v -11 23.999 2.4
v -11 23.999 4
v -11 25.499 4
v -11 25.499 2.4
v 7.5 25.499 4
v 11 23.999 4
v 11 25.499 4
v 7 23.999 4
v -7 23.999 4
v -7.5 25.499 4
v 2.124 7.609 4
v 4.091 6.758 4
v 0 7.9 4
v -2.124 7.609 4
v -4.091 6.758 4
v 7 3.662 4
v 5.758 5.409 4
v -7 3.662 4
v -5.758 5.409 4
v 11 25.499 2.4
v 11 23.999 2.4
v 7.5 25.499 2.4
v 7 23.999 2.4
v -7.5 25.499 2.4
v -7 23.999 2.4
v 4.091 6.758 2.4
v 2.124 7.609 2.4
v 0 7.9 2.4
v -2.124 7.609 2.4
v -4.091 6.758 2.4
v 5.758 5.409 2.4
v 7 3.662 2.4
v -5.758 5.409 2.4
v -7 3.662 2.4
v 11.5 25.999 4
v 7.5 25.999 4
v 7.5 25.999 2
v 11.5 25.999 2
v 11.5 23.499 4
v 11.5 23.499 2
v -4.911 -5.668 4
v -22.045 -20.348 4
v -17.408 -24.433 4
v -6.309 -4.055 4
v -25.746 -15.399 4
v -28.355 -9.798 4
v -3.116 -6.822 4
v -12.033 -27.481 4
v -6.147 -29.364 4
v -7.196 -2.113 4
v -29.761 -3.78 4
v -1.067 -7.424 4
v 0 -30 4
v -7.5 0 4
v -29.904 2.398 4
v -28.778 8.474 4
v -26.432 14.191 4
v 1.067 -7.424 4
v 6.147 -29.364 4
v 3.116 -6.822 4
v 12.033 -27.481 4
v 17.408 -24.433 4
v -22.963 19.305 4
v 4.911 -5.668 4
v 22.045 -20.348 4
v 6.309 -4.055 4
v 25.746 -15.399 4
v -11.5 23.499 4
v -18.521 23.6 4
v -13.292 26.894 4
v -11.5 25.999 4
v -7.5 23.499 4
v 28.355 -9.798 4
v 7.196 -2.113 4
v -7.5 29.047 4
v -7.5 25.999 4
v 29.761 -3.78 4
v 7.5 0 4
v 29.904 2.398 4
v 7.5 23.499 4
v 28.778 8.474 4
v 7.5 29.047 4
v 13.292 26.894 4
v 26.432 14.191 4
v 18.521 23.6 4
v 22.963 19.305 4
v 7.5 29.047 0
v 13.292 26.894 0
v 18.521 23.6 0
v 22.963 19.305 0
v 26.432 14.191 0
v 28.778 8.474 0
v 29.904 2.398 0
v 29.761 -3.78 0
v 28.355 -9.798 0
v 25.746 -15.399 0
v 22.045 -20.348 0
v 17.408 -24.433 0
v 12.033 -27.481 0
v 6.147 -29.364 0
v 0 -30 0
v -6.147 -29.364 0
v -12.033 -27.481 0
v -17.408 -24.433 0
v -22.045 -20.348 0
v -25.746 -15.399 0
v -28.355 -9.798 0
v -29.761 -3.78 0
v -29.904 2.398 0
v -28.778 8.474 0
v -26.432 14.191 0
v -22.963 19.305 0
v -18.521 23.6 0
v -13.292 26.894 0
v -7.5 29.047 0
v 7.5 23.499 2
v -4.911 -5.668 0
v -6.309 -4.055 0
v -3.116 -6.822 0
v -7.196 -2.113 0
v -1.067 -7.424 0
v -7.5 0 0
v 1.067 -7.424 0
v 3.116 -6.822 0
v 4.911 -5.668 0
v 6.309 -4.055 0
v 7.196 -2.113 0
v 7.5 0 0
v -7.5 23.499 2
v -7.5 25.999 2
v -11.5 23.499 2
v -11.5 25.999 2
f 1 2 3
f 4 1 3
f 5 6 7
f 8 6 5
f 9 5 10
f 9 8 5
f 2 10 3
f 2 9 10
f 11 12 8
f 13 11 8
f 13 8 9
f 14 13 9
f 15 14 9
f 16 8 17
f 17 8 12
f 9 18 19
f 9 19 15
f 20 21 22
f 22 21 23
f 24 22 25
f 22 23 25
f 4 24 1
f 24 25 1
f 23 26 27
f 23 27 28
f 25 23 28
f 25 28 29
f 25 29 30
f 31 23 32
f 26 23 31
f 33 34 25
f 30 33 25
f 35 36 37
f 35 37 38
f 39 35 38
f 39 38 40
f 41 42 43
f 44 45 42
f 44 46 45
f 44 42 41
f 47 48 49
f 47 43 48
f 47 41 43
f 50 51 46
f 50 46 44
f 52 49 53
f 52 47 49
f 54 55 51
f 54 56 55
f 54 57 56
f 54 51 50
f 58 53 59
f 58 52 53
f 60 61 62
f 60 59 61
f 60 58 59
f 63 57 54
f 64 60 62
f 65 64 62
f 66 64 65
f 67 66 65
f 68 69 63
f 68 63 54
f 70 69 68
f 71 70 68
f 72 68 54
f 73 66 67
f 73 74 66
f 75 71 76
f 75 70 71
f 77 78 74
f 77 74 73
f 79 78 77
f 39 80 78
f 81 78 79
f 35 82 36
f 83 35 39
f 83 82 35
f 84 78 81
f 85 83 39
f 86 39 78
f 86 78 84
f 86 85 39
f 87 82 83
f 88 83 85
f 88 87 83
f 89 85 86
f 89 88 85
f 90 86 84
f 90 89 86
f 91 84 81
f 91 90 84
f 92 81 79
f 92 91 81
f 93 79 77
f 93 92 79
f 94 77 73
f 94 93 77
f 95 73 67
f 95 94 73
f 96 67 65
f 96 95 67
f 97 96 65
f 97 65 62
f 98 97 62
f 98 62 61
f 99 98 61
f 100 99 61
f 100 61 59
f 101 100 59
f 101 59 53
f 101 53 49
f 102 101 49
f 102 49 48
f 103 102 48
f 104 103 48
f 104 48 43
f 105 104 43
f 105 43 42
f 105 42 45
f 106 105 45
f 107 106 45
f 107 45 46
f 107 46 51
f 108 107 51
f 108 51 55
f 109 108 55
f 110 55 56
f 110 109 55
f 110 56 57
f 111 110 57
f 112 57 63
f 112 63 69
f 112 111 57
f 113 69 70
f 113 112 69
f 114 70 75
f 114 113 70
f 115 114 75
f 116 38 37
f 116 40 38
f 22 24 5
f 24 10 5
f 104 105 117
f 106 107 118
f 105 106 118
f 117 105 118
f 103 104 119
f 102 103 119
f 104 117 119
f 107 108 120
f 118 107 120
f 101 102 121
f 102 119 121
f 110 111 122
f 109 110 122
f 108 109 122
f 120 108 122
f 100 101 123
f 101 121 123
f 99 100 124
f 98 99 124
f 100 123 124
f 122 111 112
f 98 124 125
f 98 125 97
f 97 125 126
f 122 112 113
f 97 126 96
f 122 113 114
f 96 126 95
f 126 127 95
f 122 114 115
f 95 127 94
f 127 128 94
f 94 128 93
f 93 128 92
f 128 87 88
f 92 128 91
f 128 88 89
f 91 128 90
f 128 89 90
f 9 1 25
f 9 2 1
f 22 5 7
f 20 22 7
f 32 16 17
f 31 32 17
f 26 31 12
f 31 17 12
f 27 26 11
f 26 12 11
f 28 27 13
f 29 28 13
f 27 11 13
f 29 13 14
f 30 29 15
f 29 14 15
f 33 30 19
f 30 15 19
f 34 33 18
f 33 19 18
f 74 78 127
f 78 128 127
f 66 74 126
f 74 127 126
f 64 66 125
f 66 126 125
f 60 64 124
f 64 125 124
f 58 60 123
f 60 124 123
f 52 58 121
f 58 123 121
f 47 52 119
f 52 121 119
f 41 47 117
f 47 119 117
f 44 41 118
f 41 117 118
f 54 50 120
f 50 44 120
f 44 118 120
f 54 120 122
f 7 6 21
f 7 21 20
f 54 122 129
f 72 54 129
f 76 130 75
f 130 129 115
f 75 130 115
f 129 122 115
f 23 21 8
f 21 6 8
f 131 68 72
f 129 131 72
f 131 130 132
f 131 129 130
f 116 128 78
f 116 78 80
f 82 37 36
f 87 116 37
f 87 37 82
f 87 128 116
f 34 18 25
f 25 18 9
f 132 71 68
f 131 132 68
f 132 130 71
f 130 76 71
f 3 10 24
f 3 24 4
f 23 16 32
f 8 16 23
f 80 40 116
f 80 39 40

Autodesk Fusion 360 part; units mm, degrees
sketch "Sketch1" plane through (0, 0, 0) normal (0, 0, 1) x (1, 0, 0)
  circle A0 centre (0, 0) radius 30
  circle A1 centre (0, 0) radius 7.5
  line L0 (-7.5, 0) -> (-7.5, 29.0474)
  line L1 (7.5, 0) -> (7.5, 29.0474)
  dimension "d1" = 60
  dimension "d2" = 15
extrude "Extrude1" add sketch "Sketch1" along normal blind 4 contours A0 A1 L0 L1 picked at (-22.4151, 1.0871) makes body 1
copy_body "Body->Comp1" bodies 1 removing the originals makes body 2 in component "cap"
sketch "Sketch2" plane through (0, 0, 4) normal (0, 0, 1) x (-1, 0, 0)
  line L0 (7.5, 0) -> (7.5, -29.0474)
  arc A0 (7.5, -29.0474) -> (-7.5, -29.0474) centre (0, 0) ccw
  line L1 (-7.5, -29.0474) -> (-7.5, 0)
  arc A1 (7.5, 0) -> (-7.5, 0) centre (0, 0) ccw
  line L2 (7.5, -25.9986) -> (11.5, -25.9986)
  line L3 (11.5, -25.9986) -> (11.5, -23.4986)
  line L4 (11.5, -23.4986) -> (7.5, -23.4986)
  line L5 (7.5, -23.4986) -> (7.5, -25.9986)
  line L6 (0, -31.0207) -> (0, -18.5293)
  line L7 (-7.5, -25.9986) -> (-11.5, -25.9986)
  line L8 (-11.5, -25.9986) -> (-11.5, -23.4986)
  line L9 (-11.5, -23.4986) -> (-7.5, -23.4986)
  line L10 (-7.5, -23.4986) -> (-7.5, -25.9986)
  dimension "d5" = 4
  dimension "d6" = 2.5
extrude "Extrude1'" cut sketch "Sketch2" against normal blind 2 contours L0 L2 L3 L4 L5 | L1 L7 L8 L9 L10 bodies 2 in component "cap"
sketch "Sketch3" plane through (0, 0, 4) normal (0, 0, 1) x (-1, 0, 0)
  line L0 (11.5, -25.9986) -> (7.5, -25.9986)
  line L1 (7.5, -25.9986) -> (7.5, -29.0474)
  arc A0 (7.5, -29.0474) -> (-7.5, -29.0474) centre (0, 0) ccw
  line L2 (-7.5, -29.0474) -> (-7.5, -25.9986)
  line L3 (-7.5, -25.9986) -> (-11.5, -25.9986)
  line L4 (-11.5, -25.9986) -> (-11.5, -23.4986)
  line L5 (-11.5, -23.4986) -> (-7.5, -23.4986)
  line L6 (-7.5, -23.4986) -> (-7.5, 0)
  arc A1 (7.5, 0) -> (-7.5, 0) centre (0, 0) ccw
  line L7 (7.5, 0) -> (7.5, -23.4986)
  line L8 (7.5, -23.4986) -> (11.5, -23.4986)
  line L9 (11.5, -23.4986) -> (11.5, -25.9986)
  circle A2 centre (0, 0) radius 7.5
  line L10 (7.5, 0) -> (7.5, -23.4986)
  line L11 (7.5, -25.9986) -> (-7.5, -25.9986)
  line L12 (7.5, -25.9986) -> (11.5, -25.9986)
  line L13 (11.5, -23.4986) -> (7.5, -23.4986)
  line L14 (-7.5, -25.9986) -> (-11.5, -25.9986)
  line L15 (-11.5, -23.4986) -> (-7.5, -23.4986)
  line L16 (-7.5, 0) -> (-7.5, -23.4986)
  line L17 (11.5, -23.4986) -> (11.5, -25.9986)
  line L18 (-11.5, -23.4986) -> (-11.5, -25.9986)
  circle A3 centre (0, 0) radius 7.9
  line L19 (7, 0) -> (7, -23.9986)
  line L20 (11, -23.9986) -> (7, -23.9986)
  line L21 (11, -23.9986) -> (11, -25.4986)
  line L22 (7.5, -25.4986) -> (11, -25.4986)
  line L23 (7.5, -25.4986) -> (-7.5, -25.4986)
  line L24 (-7.5, -25.4986) -> (-11, -25.4986)
  line L25 (-11, -23.9986) -> (-11, -25.4986)
  line L26 (-11, -23.9986) -> (-7, -23.9986)
  line L27 (-7, 0) -> (-7, -23.9986)
  dimension "d9" = 15
  dimension "d10" = 0.4
  dimension "d11" = -0.5
extrude "Extrude1''" add sketch "Sketch3" against normal blind 1.6 separate body contours A3 L19 L20 L21 L22 L23 L24 L25 L26 L27 makes body 3 in component "cover"
component "cap" placed x (1, 0, 0) y (0, 1, 0) z (0, 0, 1) at (0, 0, 0)
component "cover" placed x (1, 0, 0) y (0, 1, 0) z (0, 0, 1) at (0, 0, 0)
